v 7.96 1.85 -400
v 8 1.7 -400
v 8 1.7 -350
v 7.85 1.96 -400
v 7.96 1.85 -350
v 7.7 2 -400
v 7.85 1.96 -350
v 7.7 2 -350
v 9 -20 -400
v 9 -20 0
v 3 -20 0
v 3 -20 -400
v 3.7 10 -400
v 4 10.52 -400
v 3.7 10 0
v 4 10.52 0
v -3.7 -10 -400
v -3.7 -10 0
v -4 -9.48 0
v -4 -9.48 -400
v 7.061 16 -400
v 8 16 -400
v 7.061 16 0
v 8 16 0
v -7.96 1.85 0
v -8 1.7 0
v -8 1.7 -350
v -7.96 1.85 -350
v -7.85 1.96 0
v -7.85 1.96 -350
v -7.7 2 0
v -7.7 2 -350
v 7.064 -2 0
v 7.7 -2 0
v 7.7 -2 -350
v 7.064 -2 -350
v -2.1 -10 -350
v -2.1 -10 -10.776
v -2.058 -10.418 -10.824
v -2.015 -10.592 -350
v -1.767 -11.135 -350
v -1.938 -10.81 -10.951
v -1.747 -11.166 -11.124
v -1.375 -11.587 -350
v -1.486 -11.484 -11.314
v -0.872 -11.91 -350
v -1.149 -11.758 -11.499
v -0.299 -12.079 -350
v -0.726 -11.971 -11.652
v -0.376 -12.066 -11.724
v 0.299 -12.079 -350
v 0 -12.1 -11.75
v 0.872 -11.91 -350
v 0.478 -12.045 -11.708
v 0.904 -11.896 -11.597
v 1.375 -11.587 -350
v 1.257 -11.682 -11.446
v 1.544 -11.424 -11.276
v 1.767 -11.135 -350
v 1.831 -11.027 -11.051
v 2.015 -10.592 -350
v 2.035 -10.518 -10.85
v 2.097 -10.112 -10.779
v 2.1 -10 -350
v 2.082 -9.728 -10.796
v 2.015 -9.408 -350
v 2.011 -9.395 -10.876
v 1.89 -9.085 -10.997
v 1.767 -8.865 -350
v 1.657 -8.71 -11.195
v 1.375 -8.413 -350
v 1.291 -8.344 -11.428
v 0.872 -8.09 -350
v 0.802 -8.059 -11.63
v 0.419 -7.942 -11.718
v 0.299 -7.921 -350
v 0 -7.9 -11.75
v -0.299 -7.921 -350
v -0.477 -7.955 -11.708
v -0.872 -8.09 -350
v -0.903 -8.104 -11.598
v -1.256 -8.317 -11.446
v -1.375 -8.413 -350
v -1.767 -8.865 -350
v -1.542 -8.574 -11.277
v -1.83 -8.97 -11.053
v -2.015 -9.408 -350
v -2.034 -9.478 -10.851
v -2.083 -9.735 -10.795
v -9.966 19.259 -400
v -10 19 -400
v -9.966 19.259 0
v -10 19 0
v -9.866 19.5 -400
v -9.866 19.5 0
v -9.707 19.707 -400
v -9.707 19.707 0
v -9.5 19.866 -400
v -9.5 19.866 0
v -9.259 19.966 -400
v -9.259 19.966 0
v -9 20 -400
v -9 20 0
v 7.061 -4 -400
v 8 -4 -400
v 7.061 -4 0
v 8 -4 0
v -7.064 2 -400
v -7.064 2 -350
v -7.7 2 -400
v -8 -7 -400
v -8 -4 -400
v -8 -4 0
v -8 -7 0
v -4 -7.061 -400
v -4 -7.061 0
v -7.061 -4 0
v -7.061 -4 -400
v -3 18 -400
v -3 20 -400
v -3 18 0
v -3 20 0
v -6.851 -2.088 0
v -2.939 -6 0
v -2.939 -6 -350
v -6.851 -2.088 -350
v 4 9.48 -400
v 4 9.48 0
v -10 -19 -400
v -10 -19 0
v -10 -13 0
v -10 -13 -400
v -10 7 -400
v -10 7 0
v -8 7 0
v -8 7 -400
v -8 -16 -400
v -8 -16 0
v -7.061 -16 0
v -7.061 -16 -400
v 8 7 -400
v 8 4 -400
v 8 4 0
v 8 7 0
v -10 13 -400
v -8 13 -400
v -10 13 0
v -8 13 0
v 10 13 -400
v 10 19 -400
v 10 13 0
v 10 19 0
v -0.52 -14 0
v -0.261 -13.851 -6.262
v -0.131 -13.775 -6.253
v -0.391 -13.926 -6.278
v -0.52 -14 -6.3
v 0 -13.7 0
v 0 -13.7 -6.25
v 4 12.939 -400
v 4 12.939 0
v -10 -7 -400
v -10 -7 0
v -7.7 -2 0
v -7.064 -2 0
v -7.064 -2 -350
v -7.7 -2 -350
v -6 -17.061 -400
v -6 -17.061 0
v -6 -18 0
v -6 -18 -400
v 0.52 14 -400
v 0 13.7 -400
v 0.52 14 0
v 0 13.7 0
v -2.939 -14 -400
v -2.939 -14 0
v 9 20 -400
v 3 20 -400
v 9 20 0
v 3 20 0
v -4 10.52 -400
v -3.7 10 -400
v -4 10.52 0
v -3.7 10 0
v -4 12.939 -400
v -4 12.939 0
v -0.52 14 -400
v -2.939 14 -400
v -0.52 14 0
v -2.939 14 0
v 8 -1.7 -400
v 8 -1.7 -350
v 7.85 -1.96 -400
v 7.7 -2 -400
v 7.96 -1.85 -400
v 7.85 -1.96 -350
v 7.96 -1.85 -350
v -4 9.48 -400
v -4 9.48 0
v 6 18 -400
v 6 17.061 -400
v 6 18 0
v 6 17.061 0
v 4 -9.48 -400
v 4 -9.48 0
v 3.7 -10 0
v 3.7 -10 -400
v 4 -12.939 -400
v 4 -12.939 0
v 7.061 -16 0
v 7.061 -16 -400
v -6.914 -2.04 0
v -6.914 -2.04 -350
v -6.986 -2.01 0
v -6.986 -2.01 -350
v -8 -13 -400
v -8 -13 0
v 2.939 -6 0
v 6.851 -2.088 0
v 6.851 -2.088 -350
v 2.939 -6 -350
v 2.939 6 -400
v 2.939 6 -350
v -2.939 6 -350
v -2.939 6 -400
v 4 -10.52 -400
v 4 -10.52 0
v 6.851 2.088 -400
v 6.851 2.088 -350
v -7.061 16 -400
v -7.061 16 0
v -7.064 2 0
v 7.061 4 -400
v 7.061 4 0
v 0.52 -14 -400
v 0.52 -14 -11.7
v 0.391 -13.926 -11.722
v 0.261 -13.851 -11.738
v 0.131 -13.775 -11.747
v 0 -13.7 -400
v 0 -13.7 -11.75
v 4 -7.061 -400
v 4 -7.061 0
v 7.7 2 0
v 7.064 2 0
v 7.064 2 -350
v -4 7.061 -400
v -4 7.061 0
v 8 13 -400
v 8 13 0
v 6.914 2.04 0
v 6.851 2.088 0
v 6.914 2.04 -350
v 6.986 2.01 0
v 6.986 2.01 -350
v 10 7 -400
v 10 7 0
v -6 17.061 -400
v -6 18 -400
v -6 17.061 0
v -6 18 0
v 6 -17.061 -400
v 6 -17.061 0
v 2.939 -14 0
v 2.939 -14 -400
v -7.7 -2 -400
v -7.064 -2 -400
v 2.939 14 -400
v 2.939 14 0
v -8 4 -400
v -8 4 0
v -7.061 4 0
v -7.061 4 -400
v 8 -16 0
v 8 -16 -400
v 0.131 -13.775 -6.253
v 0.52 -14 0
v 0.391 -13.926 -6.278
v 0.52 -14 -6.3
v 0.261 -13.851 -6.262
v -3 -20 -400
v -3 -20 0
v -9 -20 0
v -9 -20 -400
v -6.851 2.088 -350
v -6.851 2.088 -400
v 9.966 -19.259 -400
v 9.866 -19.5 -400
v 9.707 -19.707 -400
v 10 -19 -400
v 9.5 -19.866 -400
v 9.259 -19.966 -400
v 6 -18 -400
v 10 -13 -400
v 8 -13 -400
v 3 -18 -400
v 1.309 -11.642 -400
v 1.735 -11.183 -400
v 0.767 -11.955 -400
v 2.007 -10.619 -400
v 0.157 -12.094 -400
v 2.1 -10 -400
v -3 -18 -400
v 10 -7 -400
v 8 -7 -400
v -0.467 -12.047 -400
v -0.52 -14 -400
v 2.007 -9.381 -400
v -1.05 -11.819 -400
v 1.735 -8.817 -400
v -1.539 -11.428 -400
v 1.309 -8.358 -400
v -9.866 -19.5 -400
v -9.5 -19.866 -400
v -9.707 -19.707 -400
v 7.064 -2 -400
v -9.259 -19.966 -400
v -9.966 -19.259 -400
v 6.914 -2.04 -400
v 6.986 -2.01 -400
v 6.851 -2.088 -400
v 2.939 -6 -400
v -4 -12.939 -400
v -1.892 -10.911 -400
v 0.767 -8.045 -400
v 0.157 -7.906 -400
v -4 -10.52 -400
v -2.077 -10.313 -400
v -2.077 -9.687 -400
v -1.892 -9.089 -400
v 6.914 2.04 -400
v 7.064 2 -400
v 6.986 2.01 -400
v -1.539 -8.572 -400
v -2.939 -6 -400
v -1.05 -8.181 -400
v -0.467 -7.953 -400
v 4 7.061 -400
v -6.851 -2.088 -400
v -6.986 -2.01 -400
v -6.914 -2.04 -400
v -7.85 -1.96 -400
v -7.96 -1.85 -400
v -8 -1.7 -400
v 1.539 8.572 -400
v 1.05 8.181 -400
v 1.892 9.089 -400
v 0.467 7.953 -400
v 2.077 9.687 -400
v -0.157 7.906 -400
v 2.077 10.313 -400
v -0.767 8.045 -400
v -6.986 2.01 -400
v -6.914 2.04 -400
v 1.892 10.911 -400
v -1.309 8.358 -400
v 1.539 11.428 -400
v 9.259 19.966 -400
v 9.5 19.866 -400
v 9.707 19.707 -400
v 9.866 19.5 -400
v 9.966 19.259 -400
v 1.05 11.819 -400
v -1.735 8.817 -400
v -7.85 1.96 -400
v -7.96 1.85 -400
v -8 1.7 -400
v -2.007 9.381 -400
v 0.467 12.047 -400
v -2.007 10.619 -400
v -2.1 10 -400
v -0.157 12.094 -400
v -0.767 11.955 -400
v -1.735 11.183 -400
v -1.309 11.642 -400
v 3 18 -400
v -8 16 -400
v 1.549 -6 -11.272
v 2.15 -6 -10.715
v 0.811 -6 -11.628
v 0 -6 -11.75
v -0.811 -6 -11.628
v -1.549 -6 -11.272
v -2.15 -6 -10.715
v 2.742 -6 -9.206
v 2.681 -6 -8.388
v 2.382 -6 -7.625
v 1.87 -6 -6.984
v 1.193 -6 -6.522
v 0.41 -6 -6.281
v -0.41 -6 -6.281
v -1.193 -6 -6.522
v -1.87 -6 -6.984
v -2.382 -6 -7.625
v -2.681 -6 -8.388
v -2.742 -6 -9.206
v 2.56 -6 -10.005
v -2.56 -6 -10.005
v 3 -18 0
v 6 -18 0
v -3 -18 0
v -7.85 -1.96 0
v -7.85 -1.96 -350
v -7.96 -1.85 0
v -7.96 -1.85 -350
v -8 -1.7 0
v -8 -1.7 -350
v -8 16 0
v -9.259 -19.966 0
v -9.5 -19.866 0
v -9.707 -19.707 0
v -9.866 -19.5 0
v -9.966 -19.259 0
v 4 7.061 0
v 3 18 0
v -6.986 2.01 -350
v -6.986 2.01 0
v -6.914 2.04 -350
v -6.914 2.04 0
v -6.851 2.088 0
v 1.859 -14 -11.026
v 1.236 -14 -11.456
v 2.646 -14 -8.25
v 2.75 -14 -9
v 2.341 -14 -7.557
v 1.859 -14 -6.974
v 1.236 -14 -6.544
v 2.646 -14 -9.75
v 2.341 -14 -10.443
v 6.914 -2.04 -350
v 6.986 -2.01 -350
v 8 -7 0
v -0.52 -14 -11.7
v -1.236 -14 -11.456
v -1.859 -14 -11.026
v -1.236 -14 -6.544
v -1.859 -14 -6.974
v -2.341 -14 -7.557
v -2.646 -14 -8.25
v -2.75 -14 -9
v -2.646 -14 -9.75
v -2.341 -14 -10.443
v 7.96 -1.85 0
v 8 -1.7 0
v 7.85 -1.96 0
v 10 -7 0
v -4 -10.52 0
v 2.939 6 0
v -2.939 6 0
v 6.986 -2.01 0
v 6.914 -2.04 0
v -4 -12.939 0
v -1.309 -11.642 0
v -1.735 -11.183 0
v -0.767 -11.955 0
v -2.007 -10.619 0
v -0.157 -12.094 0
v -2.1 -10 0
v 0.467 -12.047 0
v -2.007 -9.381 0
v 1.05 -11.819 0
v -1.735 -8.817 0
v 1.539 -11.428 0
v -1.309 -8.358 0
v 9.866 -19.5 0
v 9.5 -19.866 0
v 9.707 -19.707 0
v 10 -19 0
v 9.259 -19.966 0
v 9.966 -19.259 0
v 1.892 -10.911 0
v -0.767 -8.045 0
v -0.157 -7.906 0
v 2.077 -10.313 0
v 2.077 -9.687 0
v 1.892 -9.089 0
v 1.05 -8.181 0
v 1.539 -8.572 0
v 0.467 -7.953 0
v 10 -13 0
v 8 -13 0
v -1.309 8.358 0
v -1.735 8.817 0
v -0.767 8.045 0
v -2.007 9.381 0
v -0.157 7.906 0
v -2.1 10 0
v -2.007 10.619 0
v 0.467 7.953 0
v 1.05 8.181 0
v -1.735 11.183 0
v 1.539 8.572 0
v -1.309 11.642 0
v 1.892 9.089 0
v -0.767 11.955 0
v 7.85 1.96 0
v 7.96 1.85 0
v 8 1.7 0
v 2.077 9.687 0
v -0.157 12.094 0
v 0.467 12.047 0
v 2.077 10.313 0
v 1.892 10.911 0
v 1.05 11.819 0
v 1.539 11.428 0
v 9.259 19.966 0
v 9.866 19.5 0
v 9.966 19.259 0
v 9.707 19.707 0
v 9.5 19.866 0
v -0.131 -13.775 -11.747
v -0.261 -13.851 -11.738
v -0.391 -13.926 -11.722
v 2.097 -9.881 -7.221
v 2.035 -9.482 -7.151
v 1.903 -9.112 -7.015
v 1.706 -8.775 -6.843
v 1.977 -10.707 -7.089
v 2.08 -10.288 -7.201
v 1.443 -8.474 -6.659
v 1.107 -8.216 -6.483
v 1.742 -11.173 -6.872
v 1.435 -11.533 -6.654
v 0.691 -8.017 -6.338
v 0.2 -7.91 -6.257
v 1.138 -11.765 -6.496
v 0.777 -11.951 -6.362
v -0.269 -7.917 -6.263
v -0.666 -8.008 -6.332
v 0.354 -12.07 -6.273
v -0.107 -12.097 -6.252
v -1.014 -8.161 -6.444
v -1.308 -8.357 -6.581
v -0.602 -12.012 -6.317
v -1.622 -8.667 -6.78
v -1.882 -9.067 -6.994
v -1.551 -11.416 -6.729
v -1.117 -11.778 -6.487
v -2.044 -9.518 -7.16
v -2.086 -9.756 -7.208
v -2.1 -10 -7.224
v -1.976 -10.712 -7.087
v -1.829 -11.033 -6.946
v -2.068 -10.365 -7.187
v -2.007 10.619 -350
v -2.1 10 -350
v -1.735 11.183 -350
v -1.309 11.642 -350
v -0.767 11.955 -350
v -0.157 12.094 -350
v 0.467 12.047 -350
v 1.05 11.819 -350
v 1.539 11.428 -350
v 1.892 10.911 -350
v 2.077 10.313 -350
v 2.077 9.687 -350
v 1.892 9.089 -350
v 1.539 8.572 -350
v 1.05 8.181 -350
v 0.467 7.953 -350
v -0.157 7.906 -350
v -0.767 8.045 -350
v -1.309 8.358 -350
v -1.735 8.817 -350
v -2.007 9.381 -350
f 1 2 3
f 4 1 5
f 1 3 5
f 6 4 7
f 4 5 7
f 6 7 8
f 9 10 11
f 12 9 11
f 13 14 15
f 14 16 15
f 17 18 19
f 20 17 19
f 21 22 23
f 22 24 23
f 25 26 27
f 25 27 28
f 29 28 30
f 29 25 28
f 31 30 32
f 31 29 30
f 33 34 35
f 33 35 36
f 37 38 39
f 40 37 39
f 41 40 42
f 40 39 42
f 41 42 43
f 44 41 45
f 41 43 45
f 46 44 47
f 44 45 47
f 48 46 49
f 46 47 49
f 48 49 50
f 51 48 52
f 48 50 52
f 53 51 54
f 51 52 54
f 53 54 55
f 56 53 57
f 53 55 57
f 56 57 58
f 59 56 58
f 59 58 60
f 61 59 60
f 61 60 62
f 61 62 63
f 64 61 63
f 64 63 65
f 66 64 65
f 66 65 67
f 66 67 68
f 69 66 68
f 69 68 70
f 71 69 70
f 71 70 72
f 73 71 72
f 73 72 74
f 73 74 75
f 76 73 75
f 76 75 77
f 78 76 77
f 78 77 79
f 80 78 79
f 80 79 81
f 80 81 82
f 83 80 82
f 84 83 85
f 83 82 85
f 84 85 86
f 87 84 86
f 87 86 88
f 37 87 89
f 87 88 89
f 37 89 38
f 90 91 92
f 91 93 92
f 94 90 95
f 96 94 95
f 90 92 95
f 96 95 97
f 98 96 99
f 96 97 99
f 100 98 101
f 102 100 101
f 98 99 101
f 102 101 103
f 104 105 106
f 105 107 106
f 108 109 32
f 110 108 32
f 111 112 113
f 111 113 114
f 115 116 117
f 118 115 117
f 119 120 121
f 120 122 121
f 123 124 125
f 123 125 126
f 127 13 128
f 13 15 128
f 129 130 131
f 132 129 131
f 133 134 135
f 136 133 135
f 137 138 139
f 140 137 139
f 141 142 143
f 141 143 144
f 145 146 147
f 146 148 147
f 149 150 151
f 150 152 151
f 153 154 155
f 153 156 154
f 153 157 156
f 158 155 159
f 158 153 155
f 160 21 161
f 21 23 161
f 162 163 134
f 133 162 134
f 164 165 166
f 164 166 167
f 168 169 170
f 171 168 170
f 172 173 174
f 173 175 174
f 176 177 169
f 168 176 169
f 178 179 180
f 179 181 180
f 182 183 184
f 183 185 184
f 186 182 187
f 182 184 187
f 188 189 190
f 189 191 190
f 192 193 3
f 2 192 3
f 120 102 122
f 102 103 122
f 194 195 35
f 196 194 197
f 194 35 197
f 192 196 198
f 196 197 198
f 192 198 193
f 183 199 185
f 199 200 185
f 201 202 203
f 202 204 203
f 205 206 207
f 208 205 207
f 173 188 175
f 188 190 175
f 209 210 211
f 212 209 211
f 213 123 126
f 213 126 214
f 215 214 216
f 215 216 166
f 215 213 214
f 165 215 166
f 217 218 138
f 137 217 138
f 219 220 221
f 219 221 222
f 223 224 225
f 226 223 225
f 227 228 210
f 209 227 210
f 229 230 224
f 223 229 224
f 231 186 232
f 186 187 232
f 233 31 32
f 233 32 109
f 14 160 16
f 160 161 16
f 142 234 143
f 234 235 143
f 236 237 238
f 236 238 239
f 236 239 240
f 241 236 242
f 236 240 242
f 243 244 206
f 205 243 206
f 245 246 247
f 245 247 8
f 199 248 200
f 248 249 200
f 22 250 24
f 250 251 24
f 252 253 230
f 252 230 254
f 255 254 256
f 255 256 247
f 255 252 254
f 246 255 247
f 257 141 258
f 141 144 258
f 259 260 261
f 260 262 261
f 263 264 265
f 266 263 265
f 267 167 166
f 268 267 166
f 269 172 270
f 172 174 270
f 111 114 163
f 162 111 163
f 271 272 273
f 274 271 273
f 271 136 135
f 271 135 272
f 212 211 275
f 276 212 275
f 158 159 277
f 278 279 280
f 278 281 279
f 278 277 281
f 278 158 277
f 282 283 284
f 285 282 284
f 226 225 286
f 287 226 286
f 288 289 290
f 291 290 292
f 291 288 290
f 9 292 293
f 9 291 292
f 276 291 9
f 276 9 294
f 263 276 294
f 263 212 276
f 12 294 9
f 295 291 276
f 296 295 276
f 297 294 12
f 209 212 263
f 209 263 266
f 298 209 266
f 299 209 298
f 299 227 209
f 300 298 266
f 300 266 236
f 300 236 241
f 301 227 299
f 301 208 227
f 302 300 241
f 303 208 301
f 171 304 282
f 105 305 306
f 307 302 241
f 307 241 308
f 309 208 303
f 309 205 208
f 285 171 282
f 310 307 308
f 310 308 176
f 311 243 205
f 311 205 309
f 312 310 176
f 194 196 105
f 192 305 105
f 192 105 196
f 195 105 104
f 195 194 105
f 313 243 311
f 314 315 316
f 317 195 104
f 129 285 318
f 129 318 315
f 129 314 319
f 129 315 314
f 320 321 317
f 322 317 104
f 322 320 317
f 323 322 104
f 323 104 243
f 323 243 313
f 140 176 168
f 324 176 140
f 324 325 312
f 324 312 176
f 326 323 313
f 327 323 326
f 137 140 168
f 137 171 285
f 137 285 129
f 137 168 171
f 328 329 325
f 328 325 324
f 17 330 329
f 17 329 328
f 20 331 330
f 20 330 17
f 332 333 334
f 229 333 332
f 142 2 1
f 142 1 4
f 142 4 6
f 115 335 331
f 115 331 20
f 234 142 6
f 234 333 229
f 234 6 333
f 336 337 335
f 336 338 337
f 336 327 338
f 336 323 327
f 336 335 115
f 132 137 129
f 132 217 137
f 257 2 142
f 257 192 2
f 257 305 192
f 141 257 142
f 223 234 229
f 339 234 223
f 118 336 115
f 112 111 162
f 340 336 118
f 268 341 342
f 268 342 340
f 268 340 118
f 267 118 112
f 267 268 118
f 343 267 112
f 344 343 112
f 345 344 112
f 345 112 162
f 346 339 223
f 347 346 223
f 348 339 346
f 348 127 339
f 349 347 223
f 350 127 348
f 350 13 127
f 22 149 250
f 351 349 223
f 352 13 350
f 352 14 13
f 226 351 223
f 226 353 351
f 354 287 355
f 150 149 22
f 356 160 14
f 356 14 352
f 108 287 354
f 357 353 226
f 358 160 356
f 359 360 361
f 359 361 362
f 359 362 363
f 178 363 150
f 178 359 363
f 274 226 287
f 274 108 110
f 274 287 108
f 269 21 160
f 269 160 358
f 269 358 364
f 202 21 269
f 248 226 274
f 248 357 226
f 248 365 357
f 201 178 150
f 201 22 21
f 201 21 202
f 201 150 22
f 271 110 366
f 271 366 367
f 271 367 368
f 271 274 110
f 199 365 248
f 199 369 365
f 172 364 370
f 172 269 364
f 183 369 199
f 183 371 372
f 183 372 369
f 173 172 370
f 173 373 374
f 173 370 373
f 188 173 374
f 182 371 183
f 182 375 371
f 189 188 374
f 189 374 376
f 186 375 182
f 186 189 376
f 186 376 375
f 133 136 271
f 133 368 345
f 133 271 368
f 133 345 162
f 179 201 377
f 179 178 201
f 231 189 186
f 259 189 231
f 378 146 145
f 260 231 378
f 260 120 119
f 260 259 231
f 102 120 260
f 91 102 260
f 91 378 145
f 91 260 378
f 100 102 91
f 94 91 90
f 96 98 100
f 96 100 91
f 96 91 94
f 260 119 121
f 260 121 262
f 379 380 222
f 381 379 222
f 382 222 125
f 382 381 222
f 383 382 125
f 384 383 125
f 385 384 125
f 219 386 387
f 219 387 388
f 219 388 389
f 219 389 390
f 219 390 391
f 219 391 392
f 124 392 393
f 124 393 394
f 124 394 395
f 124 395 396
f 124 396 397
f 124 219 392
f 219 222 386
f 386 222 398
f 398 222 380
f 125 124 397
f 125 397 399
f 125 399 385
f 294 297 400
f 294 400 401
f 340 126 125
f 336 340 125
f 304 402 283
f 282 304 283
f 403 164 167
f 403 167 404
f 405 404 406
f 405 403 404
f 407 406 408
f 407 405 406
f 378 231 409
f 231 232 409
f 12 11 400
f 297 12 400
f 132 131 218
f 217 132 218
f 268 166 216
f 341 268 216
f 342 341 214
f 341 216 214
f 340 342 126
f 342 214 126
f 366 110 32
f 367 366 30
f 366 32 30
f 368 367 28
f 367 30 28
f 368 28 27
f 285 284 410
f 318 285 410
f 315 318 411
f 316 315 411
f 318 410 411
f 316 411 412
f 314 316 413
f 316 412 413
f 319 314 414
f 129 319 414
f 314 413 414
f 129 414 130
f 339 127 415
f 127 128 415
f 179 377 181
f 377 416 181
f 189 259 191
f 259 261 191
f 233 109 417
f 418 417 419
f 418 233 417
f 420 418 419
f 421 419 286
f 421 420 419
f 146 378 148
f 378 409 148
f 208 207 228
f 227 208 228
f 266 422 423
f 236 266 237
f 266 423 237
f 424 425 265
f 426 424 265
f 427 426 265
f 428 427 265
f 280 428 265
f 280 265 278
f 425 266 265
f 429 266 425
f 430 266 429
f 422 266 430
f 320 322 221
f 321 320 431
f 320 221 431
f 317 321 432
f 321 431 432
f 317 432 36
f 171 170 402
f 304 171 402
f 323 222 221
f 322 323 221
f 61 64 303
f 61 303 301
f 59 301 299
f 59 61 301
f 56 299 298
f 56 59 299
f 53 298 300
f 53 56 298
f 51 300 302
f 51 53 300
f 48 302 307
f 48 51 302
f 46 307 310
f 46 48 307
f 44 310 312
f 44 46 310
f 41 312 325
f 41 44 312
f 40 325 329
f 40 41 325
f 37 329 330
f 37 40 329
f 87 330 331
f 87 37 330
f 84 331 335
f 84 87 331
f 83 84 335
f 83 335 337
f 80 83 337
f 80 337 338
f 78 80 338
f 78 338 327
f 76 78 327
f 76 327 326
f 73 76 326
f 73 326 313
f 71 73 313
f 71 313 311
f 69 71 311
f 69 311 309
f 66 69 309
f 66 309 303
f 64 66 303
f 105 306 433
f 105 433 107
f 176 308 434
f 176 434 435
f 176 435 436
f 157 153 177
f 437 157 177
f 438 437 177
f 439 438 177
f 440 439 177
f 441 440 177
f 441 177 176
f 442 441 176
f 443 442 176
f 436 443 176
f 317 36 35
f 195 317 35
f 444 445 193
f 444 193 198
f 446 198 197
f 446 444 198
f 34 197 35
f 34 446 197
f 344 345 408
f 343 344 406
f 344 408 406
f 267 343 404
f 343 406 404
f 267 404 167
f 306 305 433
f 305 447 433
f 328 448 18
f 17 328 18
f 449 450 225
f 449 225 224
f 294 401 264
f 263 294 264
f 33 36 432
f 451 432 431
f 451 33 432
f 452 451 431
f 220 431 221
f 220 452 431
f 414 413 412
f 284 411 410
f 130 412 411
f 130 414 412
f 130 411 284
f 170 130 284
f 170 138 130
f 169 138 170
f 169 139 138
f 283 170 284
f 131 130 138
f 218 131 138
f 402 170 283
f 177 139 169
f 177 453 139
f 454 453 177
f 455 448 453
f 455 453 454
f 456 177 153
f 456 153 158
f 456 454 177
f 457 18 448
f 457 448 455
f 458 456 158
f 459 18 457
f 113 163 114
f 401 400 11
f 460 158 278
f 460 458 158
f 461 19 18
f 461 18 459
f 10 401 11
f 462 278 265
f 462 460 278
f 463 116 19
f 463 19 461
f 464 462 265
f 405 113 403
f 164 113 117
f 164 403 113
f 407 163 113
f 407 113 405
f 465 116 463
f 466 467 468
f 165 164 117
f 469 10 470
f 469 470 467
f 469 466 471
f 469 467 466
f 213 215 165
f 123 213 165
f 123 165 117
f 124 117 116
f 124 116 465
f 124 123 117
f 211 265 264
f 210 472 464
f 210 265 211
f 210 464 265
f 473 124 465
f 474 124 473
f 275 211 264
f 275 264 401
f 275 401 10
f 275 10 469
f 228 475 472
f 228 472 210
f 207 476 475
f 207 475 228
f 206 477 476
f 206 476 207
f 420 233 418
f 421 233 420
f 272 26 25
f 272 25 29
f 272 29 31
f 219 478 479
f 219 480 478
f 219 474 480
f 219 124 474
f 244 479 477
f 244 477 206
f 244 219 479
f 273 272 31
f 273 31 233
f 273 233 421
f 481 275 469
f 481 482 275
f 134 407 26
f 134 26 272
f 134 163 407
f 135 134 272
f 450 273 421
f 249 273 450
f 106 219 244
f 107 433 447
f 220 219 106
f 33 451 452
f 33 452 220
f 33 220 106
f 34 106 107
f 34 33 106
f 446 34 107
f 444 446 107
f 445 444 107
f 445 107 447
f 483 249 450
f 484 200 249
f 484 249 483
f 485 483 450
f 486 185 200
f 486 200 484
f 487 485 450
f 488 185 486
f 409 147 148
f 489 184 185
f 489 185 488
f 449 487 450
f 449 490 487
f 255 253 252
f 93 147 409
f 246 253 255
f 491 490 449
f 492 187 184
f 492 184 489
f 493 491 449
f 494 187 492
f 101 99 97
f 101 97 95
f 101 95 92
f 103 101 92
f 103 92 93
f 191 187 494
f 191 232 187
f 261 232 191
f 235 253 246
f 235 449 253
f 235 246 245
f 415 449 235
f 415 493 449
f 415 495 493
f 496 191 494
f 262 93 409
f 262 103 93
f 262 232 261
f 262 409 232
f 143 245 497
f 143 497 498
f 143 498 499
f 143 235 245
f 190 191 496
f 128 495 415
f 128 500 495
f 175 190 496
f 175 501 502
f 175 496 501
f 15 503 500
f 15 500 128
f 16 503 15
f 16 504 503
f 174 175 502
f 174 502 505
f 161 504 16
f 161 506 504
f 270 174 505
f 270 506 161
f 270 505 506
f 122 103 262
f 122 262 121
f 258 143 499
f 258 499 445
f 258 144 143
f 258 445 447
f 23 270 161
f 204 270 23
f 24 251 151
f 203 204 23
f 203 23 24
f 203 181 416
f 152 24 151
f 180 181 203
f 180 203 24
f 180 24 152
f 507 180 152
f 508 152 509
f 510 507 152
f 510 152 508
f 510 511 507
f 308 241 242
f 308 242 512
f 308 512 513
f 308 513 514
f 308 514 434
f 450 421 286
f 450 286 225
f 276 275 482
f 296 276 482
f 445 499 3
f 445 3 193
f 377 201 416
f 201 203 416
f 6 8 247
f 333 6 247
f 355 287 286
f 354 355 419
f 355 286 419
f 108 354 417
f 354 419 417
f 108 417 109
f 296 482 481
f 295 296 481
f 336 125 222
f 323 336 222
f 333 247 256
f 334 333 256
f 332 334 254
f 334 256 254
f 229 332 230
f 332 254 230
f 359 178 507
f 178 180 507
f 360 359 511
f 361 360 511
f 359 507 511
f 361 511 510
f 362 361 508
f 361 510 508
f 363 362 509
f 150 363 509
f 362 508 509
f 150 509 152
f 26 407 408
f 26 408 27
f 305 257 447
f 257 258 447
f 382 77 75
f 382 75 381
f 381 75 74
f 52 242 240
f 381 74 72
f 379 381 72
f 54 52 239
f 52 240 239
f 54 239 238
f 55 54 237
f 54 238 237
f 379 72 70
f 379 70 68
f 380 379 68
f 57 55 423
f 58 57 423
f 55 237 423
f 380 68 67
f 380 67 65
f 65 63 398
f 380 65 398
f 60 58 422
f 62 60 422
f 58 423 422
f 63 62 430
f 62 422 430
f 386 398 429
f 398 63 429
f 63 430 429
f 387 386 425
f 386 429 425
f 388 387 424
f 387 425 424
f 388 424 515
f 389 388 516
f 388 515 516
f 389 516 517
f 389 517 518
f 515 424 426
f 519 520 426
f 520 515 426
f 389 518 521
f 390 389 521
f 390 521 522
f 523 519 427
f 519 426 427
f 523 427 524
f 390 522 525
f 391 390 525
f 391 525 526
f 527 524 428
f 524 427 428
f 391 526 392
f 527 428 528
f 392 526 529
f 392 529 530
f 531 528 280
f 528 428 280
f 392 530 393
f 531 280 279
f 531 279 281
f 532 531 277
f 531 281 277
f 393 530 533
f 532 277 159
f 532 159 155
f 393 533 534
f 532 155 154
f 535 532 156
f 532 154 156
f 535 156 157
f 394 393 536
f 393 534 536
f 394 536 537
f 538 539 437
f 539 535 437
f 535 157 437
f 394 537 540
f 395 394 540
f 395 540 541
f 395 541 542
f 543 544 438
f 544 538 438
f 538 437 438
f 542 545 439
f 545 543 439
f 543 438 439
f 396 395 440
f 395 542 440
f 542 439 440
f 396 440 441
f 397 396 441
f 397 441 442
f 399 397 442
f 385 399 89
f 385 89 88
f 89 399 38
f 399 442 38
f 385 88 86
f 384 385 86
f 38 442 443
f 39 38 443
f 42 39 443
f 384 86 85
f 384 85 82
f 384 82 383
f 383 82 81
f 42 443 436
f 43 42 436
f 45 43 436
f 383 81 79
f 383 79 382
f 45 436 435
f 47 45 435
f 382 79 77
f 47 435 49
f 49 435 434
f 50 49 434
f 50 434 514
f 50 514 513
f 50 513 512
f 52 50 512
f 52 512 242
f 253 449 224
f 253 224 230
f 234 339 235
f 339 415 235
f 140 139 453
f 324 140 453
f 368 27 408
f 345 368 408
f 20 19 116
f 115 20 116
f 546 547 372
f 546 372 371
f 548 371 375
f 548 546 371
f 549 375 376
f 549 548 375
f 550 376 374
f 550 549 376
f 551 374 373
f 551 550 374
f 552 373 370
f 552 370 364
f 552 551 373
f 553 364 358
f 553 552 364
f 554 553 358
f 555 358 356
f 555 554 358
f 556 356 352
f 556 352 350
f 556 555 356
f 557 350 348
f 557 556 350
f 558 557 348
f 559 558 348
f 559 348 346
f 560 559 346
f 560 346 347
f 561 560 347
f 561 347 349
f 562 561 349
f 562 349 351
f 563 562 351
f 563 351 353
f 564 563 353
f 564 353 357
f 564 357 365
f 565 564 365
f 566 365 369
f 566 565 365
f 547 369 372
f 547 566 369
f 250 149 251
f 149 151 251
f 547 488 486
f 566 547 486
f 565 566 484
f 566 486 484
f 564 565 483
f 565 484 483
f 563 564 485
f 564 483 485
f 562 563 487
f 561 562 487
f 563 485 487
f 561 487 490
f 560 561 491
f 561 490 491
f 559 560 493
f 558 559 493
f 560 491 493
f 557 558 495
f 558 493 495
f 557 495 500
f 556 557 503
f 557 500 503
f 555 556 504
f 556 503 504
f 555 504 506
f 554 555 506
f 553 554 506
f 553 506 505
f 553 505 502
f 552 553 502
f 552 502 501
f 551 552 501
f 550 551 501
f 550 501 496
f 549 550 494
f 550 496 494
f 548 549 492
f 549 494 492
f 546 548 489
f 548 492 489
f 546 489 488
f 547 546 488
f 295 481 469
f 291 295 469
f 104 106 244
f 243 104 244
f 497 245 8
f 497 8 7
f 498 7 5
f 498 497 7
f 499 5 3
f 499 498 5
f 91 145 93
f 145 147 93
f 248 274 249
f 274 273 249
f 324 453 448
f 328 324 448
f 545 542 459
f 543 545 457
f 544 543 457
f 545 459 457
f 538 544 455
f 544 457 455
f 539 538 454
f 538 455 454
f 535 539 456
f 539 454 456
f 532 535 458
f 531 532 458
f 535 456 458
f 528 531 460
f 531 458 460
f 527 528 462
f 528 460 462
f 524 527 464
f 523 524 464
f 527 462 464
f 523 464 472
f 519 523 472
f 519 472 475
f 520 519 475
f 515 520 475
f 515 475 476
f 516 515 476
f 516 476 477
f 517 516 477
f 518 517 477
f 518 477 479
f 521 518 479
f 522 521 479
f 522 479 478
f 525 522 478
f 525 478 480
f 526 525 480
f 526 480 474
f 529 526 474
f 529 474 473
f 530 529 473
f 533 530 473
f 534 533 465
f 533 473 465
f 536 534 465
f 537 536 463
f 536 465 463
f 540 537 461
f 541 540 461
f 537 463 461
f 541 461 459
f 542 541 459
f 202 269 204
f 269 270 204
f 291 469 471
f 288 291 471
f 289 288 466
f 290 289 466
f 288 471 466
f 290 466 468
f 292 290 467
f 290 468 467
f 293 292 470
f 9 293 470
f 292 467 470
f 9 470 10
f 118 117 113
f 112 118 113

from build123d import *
from build123d.topology import SkipClean

# Parameters (mm, degrees)
SKETCH1_R           = 2.1
BOSS_EXTRUDE1_DEPTH = 350
SKETCH3_R           = 2.75
CUT_EXTRUDE1_DEPTH  = 10
SKETCH4_R           = 2.1
BOSS_EXTRUDE2_DEPTH = 50


with BuildPart() as part:
    # Sketch1 → Boss-Extrude1 (new body)
    with BuildSketch(Plane.XY):
        with BuildLine():
            Line((-8, 4), (-8, 7))
            Line((-8, 7), (-10, 7))
            Line((-10, 7), (-10, -7))
            Line((-10, -7), (-8, -7))
            Line((-8, -7), (-8, -4))
            Line((-8, -4), (-7.060660172, -4))
            Line((-7.060660172, -4), (-4, -7.060660172))
            Line((-4, -7.060660172), (-4, -9.480384758))
            Line((-4, -9.480384758), (-3.7, -10))
            Line((-3.7, -10), (-4, -10.519615242))
            Line((-4, -10.519615242), (-4, -12.939339828))
            Line((-4, -12.939339828), (-7.060660172, -16))
            Line((-7.060660172, -16), (-8, -16))
            Line((-8, -16), (-8, -13))
            Line((-8, -13), (-10, -13))
            Line((-10, -13), (-10, -19))
            ThreePointArc((-10, -19), (-9.707106781, -19.707106781), (-9, -20))
            Line((-9, -20), (-3, -20))
            Line((-3, -20), (-3, -18))
            Line((-3, -18), (-6, -18))
            Line((-6, -18), (-6, -17.060660172))
            Line((-6, -17.060660172), (-2.939339828, -14))
            Line((-2.939339828, -14), (-0.519615242, -14))
            Line((-0.519615242, -14), (0, -13.7))
            Line((0, -13.7), (0.519615242, -14))
            Line((0.519615242, -14), (2.939339828, -14))
            Line((2.939339828, -14), (6, -17.060660172))
            Line((6, -17.060660172), (6, -18))
            Line((6, -18), (3, -18))
            Line((3, -18), (3, -20))
            Line((3, -20), (9, -20))
            ThreePointArc((9, -20), (9.707106781, -19.707106781), (10, -19))
            Line((10, -19), (10, -13))
            Line((10, -13), (8, -13))
            Line((8, -13), (8, -16))
            Line((8, -16), (7.060660172, -16))
            Line((7.060660172, -16), (4, -12.939339828))
            Line((4, -12.939339828), (4, -10.519615242))
            Line((4, -10.519615242), (3.7, -10))
            Line((3.7, -10), (4, -9.480384758))
            Line((4, -9.480384758), (4, -7.060660172))
            Line((4, -7.060660172), (7.060660172, -4))
            Line((7.060660172, -4), (8, -4))
            Line((8, -4), (8, -7))
            Line((8, -7), (10, -7))
            Line((10, -7), (10, 7))
            Line((10, 7), (8, 7))
            Line((8, 7), (8, 4))
            Line((8, 4), (7.060660172, 4))
            Line((7.060660172, 4), (4, 7.060660172))
            Line((4, 7.060660172), (4, 9.480384758))
            Line((4, 9.480384758), (3.7, 10))
            Line((3.7, 10), (4, 10.519615242))
            Line((4, 10.519615242), (4, 12.939339828))
            Line((4, 12.939339828), (7.060660172, 16))
            Line((7.060660172, 16), (8, 16))
            Line((8, 16), (8, 13))
            Line((8, 13), (10, 13))
            Line((10, 13), (10, 19))
            ThreePointArc((10, 19), (9.707106781, 19.707106781), (9, 20))
            Line((9, 20), (3, 20))
            Line((3, 20), (3, 18))
            Line((3, 18), (6, 18))
            Line((6, 18), (6, 17.060660172))
            Line((6, 17.060660172), (2.939339828, 14))
            Line((2.939339828, 14), (0.519615242, 14))
            Line((0.519615242, 14), (0, 13.7))
            Line((0, 13.7), (-0.519615242, 14))
            Line((-0.519615242, 14), (-2.939339828, 14))
            Line((-2.939339828, 14), (-6, 17.060660172))
            Line((-6, 17.060660172), (-6, 18))
            Line((-6, 18), (-3, 18))
            Line((-3, 18), (-3, 20))
            Line((-3, 20), (-9, 20))
            ThreePointArc((-9, 20), (-9.707106781, 19.707106781), (-10, 19))
            Line((-10, 19), (-10, 13))
            Line((-10, 13), (-8, 13))
            Line((-8, 13), (-8, 16))
            Line((-8, 16), (-7.060660172, 16))
            Line((-7.060660172, 16), (-4, 12.939339828))
            Line((-4, 12.939339828), (-4, 10.519615242))
            Line((-4, 10.519615242), (-3.7, 10))
            Line((-3.7, 10), (-4, 9.480384758))
            Line((-4, 9.480384758), (-4, 7.060660172))
            Line((-4, 7.060660172), (-7.060660172, 4))
            Line((-7.060660172, 4), (-8, 4))
        make_face()
        with Locations((0, 10)):
            Circle(SKETCH1_R, mode=Mode.SUBTRACT)
        with Locations((0, -10)):
            Circle(SKETCH1_R, mode=Mode.SUBTRACT)
        with BuildLine():
            Line((-8, -1.7), (-8, 1.7))
            ThreePointArc((-8, 1.7), (-7.912132034, 1.912132034), (-7.7, 2))
            Line((-7.7, 2), (-7.063603897, 2))
            ThreePointArc((-7.063603897, 2), (-6.948798867, 2.02283614), (-6.851471863, 2.087867966))
            Line((-6.851471863, 2.087867966), (-2.939339828, 6))
            Line((-2.939339828, 6), (2.939339828, 6))
            Line((2.939339828, 6), (6.851471863, 2.087867966))
            ThreePointArc((6.851471863, 2.087867966), (6.948798867, 2.02283614), (7.063603897, 2))
            Line((7.063603897, 2), (7.7, 2))
            ThreePointArc((7.7, 2), (7.912132034, 1.912132034), (8, 1.7))
            Line((8, 1.7), (8, -1.7))
            ThreePointArc((8, -1.7), (7.912132034, -1.912132034), (7.7, -2))
            Line((7.7, -2), (7.063603897, -2))
            ThreePointArc((7.063603897, -2), (6.948798867, -2.02283614), (6.851471863, -2.087867966))
            Line((6.851471863, -2.087867966), (2.939339828, -6))
            Line((2.939339828, -6), (-2.939339828, -6))
            Line((-2.939339828, -6), (-6.851471863, -2.087867966))
            ThreePointArc((-6.851471863, -2.087867966), (-6.948798867, -2.02283614), (-7.063603897, -2))
            Line((-7.063603897, -2), (-7.7, -2))
            ThreePointArc((-7.7, -2), (-7.912132034, -1.912132034), (-8, -1.7))
        make_face(mode=Mode.SUBTRACT)
    extrude(amount=-BOSS_EXTRUDE1_DEPTH)

    # Sketch3 → Cut-Extrude1 (cut)
    with BuildSketch(Plane.XZ.offset(14)):
        with Locations((0, -9)):
            Circle(SKETCH3_R)
    extrude(amount=-CUT_EXTRUDE1_DEPTH, mode=Mode.SUBTRACT)

    # Sketch4 → Boss-Extrude2 (add)
    with SkipClean():  # the faces are left unmerged after this step: merging them gives an invalid solid
        with BuildSketch(Plane(origin=(0, 0, -350), x_dir=(-1, 0, 0), z_dir=(0, 0, -1))):
            with BuildLine():
                Line((8, 4), (7.060660172, 4))
                Line((7.060660172, 4), (4, 7.060660172))
                Line((4, 7.060660172), (4, 9.480384758))
                Line((4, 9.480384758), (3.7, 10))
                Line((3.7, 10), (4, 10.519615242))
                Line((4, 10.519615242), (4, 12.939339828))
                Line((4, 12.939339828), (7.060660172, 16))
                Line((7.060660172, 16), (8, 16))
                Line((8, 16), (8, 13))
                Line((8, 13), (10, 13))
                Line((10, 13), (10, 19))
                ThreePointArc((10, 19), (9.707106781, 19.707106781), (9, 20))
                Line((9, 20), (3, 20))
                Line((3, 20), (3, 18))
                Line((3, 18), (6, 18))
                Line((6, 18), (6, 17.060660172))
                Line((6, 17.060660172), (2.939339828, 14))
                Line((2.939339828, 14), (0.519615242, 14))
                Line((0.519615242, 14), (0, 13.7))
                Line((0, 13.7), (-0.519615242, 14))
                Line((-0.519615242, 14), (-2.939339828, 14))
                Line((-2.939339828, 14), (-6, 17.060660172))
                Line((-6, 17.060660172), (-6, 18))
                Line((-6, 18), (-3, 18))
                Line((-3, 18), (-3, 20))
                Line((-3, 20), (-9, 20))
                ThreePointArc((-9, 20), (-9.707106781, 19.707106781), (-10, 19))
                Line((-10, 19), (-10, 13))
                Line((-10, 13), (-8, 13))
                Line((-8, 13), (-8, 16))
                Line((-8, 16), (-7.060660172, 16))
                Line((-7.060660172, 16), (-4, 12.939339828))
                Line((-4, 12.939339828), (-4, 10.519615242))
                Line((-4, 10.519615242), (-3.7, 10))
                Line((-3.7, 10), (-4, 9.480384758))
                Line((-4, 9.480384758), (-4, 7.060660172))
                Line((-4, 7.060660172), (-7.060660172, 4))
                Line((-7.060660172, 4), (-8, 4))
                Line((-8, 4), (-8, 7))
                Line((-8, 7), (-10, 7))
                Line((-10, 7), (-10, -7))
                Line((-10, -7), (-8, -7))
                Line((-8, -7), (-8, -4))
                Line((-8, -4), (-7.060660172, -4))
                Line((-7.060660172, -4), (-4, -7.060660172))
                Line((-4, -7.060660172), (-4, -9.480384758))
                Line((-4, -9.480384758), (-3.7, -10))
                Line((-3.7, -10), (-4, -10.519615242))
                Line((-4, -10.519615242), (-4, -12.939339828))
                Line((-4, -12.939339828), (-7.060660172, -16))
                Line((-7.060660172, -16), (-8, -16))
                Line((-8, -16), (-8, -13))
                Line((-8, -13), (-10, -13))
                Line((-10, -13), (-10, -19))
                ThreePointArc((-10, -19), (-9.707106781, -19.707106781), (-9, -20))
                Line((-9, -20), (-3, -20))
                Line((-3, -20), (-3, -18))
                Line((-3, -18), (-6, -18))
                Line((-6, -18), (-6, -17.060660172))
                Line((-6, -17.060660172), (-2.939339828, -14))
                Line((-2.939339828, -14), (-0.519615242, -14))
                Line((-0.519615242, -14), (0, -13.7))
                Line((0, -13.7), (0.519615242, -14))
                Line((0.519615242, -14), (2.939339828, -14))
                Line((2.939339828, -14), (6, -17.060660172))
                Line((6, -17.060660172), (6, -18))
                Line((6, -18), (3, -18))
                Line((3, -18), (3, -20))
                Line((3, -20), (9, -20))
                ThreePointArc((9, -20), (9.707106781, -19.707106781), (10, -19))
                Line((10, -19), (10, -13))
                Line((10, -13), (8, -13))
                Line((8, -13), (8, -16))
                Line((8, -16), (7.060660172, -16))
                Line((7.060660172, -16), (4, -12.939339828))
                Line((4, -12.939339828), (4, -10.519615242))
                Line((4, -10.519615242), (3.7, -10))
                Line((3.7, -10), (4, -9.480384758))
                Line((4, -9.480384758), (4, -7.060660172))
                Line((4, -7.060660172), (7.060660172, -4))
                Line((7.060660172, -4), (8, -4))
                Line((8, -4), (8, -7))
                Line((8, -7), (10, -7))
                Line((10, -7), (10, 7))
                Line((10, 7), (8, 7))
                Line((8, 7), (8, 4))
            make_face()
            with Locations((0, 10)):
                Circle(SKETCH4_R, mode=Mode.SUBTRACT)
            with Locations((0, -10)):
                Circle(SKETCH4_R, mode=Mode.SUBTRACT)
            with BuildLine():
                Line((-2.939339828, 6), (2.939339828, 6))
                Line((2.939339828, 6), (6.851471863, 2.087867966))
                ThreePointArc((6.851471863, 2.087867966), (6.948798867, 2.02283614), (7.063603897, 2))
                Line((7.063603897, 2), (7.7, 2))
                ThreePointArc((7.7, 2), (7.912132034, 1.912132034), (8, 1.7))
                Line((8, 1.7), (8, -1.7))
                ThreePointArc((8, -1.7), (7.912132034, -1.912132034), (7.7, -2))
                Line((7.7, -2), (7.063603897, -2))
                ThreePointArc((7.063603897, -2), (6.948798867, -2.02283614), (6.851471863, -2.087867966))
                Line((6.851471863, -2.087867966), (2.939339828, -6))
                Line((2.939339828, -6), (-2.939339828, -6))
                Line((-2.939339828, -6), (-6.851471863, -2.087867966))
                ThreePointArc((-6.851471863, -2.087867966), (-6.948798867, -2.02283614), (-7.063603897, -2))
                Line((-7.063603897, -2), (-7.7, -2))
                ThreePointArc((-7.7, -2), (-7.912132034, -1.912132034), (-8, -1.7))
                Line((-8, -1.7), (-8, 1.7))
                ThreePointArc((-8, 1.7), (-7.912132034, 1.912132034), (-7.7, 2))
                Line((-7.7, 2), (-7.063603897, 2))
                ThreePointArc((-7.063603897, 2), (-6.948798867, 2.02283614), (-6.851471863, 2.087867966))
                Line((-6.851471863, 2.087867966), (-2.939339828, 6))
            make_face(mode=Mode.SUBTRACT)
        extrude(amount=BOSS_EXTRUDE2_DEPTH)
    add(part.part.scale(1), mode=Mode.REPLACE)  # the faces are merged on a copy


solid = part.part
